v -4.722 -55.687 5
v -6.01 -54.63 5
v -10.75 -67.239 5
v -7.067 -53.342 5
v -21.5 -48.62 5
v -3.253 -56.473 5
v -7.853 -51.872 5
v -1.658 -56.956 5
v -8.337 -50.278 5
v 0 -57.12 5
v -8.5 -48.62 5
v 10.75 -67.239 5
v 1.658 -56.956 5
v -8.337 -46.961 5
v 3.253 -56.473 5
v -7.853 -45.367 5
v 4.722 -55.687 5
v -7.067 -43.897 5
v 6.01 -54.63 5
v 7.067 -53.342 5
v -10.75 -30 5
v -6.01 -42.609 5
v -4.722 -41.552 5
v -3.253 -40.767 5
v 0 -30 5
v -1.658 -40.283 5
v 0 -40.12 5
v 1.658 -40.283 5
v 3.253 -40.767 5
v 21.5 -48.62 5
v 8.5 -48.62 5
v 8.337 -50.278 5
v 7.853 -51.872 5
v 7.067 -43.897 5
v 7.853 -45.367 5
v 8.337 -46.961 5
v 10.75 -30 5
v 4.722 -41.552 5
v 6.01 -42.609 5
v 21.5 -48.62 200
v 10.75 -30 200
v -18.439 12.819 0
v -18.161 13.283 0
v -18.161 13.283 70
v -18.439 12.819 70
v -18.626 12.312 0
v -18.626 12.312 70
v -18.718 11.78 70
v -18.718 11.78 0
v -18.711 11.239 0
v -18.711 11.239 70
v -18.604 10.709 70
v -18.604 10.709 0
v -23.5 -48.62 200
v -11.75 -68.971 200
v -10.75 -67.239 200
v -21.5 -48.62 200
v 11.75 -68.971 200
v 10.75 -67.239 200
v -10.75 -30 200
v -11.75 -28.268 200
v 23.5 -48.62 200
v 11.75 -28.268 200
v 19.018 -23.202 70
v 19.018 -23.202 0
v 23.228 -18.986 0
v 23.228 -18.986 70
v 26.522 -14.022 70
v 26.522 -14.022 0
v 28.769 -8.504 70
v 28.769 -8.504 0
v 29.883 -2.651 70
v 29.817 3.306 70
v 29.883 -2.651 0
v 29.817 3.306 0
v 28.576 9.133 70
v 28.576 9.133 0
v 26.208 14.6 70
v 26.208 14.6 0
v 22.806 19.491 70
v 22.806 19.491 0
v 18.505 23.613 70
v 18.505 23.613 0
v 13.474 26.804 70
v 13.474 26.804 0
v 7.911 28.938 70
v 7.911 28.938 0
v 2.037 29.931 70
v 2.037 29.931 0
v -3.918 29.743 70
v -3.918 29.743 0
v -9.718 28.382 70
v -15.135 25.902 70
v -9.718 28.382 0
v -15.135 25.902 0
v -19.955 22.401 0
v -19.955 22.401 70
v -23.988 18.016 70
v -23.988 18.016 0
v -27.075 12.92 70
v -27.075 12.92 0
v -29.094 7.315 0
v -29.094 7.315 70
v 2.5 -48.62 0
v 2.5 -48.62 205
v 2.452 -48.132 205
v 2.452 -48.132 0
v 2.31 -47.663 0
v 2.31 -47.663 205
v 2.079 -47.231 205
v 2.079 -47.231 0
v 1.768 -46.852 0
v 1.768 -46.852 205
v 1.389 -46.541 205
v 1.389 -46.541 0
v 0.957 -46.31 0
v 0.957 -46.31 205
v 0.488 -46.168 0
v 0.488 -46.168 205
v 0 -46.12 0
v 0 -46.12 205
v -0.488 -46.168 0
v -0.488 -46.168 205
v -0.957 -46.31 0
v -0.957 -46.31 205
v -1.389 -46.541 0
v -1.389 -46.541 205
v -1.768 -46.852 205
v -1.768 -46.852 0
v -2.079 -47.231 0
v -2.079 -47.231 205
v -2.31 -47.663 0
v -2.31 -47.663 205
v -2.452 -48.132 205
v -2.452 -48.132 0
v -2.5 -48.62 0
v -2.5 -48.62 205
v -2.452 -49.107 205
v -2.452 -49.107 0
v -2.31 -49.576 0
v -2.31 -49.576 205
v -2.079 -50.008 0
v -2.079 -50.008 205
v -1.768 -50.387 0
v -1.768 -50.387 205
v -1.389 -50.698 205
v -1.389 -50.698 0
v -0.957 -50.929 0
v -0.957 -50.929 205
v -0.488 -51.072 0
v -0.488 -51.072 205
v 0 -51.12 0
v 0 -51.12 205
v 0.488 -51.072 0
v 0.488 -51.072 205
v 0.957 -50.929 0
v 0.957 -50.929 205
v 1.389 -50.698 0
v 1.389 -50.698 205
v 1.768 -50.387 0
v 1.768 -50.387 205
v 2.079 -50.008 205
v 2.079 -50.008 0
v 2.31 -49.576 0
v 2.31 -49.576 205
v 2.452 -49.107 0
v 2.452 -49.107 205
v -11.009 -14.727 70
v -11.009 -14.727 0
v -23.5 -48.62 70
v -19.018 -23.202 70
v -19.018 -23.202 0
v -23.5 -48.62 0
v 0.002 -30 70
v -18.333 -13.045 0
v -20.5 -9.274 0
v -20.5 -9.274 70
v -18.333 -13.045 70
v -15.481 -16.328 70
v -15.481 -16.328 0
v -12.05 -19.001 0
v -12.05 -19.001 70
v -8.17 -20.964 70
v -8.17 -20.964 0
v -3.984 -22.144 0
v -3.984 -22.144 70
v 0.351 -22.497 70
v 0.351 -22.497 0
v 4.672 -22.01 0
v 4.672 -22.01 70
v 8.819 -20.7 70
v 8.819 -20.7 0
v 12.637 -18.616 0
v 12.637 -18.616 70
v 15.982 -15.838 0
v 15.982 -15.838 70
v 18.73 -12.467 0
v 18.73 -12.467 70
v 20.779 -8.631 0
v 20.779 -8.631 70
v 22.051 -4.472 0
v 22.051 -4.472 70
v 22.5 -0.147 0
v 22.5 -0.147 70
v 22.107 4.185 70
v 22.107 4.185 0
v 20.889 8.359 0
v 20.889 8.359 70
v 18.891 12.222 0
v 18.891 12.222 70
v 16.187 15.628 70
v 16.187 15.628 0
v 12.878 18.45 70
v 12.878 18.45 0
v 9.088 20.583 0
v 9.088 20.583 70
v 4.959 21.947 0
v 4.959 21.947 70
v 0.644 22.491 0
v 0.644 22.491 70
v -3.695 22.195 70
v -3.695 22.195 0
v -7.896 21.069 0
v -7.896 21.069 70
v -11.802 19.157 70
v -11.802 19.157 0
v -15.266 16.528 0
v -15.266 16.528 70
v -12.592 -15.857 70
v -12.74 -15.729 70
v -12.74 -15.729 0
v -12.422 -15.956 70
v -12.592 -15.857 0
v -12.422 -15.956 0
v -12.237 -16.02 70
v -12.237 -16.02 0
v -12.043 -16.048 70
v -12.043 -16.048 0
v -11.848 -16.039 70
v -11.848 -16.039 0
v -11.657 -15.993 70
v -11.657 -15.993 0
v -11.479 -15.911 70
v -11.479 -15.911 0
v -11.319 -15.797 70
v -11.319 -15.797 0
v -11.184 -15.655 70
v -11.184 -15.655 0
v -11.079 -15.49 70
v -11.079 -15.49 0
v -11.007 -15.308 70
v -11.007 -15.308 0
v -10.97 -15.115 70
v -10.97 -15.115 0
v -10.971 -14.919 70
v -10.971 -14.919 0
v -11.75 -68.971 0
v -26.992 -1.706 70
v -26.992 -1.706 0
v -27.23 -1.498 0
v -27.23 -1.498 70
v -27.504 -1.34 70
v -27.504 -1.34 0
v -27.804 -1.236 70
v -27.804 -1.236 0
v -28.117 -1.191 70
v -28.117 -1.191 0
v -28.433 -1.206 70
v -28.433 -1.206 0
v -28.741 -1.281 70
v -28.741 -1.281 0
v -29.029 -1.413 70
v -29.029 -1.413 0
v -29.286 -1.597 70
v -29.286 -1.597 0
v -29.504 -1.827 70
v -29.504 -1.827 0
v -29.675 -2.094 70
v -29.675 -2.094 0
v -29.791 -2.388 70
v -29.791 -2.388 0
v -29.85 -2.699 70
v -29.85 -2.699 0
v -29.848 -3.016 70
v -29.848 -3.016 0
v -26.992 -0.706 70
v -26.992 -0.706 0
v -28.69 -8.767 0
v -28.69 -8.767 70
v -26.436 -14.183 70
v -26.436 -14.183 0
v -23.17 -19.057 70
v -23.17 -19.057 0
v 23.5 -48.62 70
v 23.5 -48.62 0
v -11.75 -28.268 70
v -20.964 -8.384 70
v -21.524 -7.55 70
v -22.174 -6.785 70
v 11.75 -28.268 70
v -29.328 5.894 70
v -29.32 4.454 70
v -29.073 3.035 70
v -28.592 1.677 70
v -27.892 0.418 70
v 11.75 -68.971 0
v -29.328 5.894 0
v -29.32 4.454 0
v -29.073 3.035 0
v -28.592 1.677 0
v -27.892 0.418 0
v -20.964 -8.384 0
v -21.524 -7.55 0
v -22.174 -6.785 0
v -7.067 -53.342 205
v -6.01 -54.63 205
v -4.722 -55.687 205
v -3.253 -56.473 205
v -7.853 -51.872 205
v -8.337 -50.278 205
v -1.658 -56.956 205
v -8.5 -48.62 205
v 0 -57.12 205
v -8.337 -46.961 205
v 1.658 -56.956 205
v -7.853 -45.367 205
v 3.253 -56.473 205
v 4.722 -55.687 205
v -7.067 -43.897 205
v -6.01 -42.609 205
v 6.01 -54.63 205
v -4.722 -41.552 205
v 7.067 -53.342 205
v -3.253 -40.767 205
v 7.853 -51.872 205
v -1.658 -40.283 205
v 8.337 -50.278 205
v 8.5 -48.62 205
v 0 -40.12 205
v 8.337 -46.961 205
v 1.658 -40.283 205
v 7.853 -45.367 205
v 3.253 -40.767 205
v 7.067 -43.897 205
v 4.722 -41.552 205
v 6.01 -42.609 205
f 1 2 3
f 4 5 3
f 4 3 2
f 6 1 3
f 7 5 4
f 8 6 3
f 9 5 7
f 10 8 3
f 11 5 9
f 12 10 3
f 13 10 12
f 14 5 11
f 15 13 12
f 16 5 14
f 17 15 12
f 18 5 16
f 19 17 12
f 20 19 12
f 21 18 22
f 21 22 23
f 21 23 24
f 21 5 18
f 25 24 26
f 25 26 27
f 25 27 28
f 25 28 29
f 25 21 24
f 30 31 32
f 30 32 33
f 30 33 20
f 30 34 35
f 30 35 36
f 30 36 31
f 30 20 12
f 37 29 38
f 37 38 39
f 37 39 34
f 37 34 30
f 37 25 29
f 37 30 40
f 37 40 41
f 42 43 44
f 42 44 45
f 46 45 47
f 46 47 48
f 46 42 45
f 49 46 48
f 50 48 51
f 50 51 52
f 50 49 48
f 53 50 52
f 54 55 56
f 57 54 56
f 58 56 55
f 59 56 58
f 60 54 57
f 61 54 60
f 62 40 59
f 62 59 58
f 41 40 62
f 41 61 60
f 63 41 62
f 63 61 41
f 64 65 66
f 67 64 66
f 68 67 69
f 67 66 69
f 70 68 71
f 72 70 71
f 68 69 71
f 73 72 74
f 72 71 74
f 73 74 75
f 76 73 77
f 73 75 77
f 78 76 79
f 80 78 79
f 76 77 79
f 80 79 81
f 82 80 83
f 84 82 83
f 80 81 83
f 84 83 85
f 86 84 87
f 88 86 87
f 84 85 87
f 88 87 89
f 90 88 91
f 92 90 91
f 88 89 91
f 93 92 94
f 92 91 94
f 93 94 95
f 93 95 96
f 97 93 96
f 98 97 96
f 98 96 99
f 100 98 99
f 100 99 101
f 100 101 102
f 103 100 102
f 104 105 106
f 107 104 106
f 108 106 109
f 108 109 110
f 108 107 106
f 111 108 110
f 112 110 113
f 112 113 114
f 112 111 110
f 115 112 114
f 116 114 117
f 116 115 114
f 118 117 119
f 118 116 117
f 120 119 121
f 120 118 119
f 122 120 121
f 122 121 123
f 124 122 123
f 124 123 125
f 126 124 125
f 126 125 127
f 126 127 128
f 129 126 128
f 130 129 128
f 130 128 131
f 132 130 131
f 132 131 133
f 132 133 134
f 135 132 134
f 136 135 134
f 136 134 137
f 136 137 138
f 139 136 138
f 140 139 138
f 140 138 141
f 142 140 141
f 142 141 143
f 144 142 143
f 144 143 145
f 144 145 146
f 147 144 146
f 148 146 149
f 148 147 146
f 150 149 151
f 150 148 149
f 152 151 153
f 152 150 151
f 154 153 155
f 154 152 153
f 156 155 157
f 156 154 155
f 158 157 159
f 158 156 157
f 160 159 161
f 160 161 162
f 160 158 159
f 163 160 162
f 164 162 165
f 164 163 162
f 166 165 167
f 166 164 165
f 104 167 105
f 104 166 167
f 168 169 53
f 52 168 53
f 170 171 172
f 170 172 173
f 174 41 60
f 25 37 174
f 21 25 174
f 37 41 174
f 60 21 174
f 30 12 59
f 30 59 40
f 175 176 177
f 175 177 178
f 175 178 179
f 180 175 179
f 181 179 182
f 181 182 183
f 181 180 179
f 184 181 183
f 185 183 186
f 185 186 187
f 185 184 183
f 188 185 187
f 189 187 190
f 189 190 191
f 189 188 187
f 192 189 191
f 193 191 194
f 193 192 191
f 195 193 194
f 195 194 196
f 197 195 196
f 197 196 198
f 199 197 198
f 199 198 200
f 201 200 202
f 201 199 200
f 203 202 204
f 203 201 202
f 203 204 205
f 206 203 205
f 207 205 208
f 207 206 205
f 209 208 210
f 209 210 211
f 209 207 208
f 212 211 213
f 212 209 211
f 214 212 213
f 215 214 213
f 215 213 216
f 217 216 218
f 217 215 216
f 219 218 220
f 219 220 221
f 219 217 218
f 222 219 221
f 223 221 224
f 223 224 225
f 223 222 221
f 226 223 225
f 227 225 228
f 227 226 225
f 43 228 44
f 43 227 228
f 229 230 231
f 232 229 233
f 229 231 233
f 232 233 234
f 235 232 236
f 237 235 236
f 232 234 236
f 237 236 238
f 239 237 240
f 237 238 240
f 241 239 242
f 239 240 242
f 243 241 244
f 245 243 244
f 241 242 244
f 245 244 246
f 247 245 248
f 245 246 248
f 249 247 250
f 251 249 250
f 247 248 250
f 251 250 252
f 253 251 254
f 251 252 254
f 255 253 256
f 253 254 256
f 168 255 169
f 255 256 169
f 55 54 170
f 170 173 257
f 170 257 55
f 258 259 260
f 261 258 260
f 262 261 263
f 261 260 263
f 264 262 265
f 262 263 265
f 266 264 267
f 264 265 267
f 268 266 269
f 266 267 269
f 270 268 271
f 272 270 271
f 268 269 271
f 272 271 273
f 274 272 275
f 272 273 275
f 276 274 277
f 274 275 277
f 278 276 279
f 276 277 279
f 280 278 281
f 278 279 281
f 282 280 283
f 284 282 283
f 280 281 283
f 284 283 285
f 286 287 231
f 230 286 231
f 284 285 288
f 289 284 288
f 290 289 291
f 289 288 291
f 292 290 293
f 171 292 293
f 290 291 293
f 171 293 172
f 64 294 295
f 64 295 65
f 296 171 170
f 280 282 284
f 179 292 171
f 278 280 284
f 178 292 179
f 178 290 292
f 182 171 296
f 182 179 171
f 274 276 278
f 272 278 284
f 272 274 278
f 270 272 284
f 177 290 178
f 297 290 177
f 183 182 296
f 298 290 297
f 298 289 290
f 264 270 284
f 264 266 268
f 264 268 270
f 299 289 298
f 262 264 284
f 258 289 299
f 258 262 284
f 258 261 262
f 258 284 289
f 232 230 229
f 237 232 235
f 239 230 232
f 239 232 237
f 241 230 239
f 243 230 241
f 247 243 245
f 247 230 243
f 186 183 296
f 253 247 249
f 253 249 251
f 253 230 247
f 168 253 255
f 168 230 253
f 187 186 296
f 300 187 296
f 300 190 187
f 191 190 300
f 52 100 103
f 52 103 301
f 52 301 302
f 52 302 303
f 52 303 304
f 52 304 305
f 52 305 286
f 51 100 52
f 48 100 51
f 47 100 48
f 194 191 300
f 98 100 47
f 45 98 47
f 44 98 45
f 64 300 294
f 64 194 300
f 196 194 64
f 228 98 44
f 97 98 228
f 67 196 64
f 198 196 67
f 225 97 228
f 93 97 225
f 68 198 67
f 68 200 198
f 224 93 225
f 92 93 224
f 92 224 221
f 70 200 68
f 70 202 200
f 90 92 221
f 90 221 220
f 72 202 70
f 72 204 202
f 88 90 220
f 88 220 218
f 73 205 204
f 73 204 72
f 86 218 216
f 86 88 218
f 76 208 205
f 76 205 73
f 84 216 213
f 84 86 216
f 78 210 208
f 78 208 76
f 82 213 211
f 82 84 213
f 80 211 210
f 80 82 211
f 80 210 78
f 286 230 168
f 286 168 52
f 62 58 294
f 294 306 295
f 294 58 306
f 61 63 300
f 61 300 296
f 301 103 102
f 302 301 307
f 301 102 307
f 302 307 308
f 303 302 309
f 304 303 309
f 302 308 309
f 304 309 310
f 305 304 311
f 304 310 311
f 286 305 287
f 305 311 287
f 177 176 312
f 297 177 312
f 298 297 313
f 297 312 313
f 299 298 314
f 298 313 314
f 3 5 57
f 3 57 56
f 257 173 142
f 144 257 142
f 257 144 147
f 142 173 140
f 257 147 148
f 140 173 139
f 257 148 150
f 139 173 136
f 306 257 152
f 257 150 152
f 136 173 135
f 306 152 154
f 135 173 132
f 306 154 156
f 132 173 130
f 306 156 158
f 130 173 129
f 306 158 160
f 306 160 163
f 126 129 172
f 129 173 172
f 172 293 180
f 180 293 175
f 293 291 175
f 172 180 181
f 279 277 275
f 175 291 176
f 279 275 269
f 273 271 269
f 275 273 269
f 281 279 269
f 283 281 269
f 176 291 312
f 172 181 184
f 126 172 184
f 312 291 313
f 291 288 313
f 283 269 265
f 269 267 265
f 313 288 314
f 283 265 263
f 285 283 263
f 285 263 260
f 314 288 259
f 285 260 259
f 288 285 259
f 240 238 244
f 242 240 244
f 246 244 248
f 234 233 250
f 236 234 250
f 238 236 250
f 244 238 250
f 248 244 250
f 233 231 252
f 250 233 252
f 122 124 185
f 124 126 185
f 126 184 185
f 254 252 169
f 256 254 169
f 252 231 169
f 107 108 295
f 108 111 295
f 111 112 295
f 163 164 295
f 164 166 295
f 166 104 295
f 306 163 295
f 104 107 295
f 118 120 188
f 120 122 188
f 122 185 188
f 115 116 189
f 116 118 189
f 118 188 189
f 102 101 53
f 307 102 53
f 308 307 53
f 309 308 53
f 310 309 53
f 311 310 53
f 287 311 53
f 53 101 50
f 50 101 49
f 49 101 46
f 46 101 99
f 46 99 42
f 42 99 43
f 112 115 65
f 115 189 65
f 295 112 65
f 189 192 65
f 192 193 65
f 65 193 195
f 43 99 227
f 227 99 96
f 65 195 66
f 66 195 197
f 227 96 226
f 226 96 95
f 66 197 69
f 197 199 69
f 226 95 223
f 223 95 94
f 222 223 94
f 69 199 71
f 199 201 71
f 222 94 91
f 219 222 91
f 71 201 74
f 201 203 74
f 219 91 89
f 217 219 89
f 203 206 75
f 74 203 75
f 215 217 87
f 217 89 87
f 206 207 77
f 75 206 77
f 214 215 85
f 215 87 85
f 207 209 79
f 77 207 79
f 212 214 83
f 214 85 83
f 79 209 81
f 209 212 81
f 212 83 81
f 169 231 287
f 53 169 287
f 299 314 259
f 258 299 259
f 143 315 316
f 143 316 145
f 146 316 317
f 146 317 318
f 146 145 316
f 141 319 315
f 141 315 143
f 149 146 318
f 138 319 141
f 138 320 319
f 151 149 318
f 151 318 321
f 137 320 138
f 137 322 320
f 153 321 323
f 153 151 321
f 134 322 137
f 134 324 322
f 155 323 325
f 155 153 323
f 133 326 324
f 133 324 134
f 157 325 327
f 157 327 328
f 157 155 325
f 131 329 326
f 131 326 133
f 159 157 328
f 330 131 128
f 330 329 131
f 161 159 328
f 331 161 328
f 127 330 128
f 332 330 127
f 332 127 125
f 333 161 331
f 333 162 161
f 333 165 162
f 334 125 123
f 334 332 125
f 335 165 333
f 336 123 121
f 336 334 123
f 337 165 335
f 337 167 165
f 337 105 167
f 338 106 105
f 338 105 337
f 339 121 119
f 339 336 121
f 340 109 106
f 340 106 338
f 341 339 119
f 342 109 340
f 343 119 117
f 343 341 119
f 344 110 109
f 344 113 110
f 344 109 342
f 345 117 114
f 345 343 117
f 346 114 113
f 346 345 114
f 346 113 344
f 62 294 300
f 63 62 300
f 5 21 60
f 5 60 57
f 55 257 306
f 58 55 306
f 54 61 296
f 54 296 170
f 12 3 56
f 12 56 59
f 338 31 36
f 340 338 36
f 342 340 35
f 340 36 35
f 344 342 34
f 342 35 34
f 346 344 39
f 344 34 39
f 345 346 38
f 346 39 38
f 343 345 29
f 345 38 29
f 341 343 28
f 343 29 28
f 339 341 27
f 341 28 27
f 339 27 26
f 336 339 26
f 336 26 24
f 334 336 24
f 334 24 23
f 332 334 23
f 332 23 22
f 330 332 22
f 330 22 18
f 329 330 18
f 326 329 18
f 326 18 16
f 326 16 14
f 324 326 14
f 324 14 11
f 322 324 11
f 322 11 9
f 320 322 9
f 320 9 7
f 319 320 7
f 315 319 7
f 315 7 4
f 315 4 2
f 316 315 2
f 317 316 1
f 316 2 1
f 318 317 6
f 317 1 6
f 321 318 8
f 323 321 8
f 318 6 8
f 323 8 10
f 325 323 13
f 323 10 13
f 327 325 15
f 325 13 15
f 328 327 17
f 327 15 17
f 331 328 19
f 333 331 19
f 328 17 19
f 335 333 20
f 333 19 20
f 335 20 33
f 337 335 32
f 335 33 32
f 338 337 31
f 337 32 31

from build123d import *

# Parameters (mm, degrees)
PAD_DEPTH     = 70
PAD001_DEPTH  = 200
PAD002_DEPTH  = 70
SKETCH003_R   = 2.5
PAD003_DEPTH  = 5
SKETCH004_R   = 8.5
SKETCH004_R_2 = 2.5
PAD004_DEPTH  = 205


with BuildPart() as part:
    # Sketch → Pad (new body)
    with BuildSketch(Plane.XY):
        with BuildLine():
            ThreePointArc((-29.848016, -3.015947), (29.920505, -2.182515), (-29.094406, 7.315431))
            ThreePointArc((-29.094406, 7.315431), (-29.072912, 3.034578), (-26.991574, -0.706304))
            Line((-26.991574, -0.706304), (-12.739759, -15.728805))
            ThreePointArc((-12.739759, -15.728805), (-11.4789, -15.911046), (-11.008743, -14.727014))
            Line((-11.008743, -14.727014), (-18.604437, 10.709188))
            ThreePointArc((-18.160969, 13.282665), (-18.684551, 12.047942), (-18.604437, 10.709188))
            ThreePointArc((-20.499669, -9.27435), (22.380035, -2.320351), (-18.160969, 13.282665))
            ThreePointArc((-20.499669, -9.27435), (-21.232479, -7.959372), (-22.173804, -6.784601))
            Line((-22.173804, -6.784601), (-26.991574, -1.706304))
            ThreePointArc((-26.991574, -1.706304), (-28.888073, -1.339771), (-29.848016, -3.015947))
        make_face()
    extrude(amount=PAD_DEPTH)

    # Sketch001 → Pad001 (join)
    with BuildSketch(Plane.XY):
        Polygon((23.5, -48.619546), (11.75, -28.267949), (-11.75, -28.267949), (-23.5, -48.619546), (-11.75, -68.971143), (11.75, -68.971143), align=None)
        Polygon((21.5, -48.619546), (10.75, -30), (-10.75, -30), (-21.5, -48.619546), (-10.75, -67.239092), (10.75, -67.239092), align=None, mode=Mode.SUBTRACT)
    extrude(amount=PAD001_DEPTH)

    # Sketch002 → Pad002 (join)
    with BuildSketch(Plane.XY):
        Polygon((-18.915001, -22.616726), (-23.5, -48.619546), (-11.75, -28.267949), (-6.937376, -28.267949), align=None)
        Polygon((23.5, -48.619546), (19.018119, -23.201534), (10.046046, -28.267949), (11.75, -28.267949), align=None)
    extrude(amount=PAD002_DEPTH)

    # Sketch003 → Pad003 (join)
    with BuildSketch(Plane.XY):
        Polygon((21.5, -48.619546), (10.75, -30), (-10.75, -30), (-21.5, -48.619546), (-10.75, -67.239092), (10.75, -67.239092), align=None)
        with Locations((0, -48.619546)):
            Circle(SKETCH003_R, mode=Mode.SUBTRACT)
    extrude(amount=PAD003_DEPTH)

    # Sketch004 → Pad004 (join)
    with BuildSketch(Plane.XY):
        with Locations((0, -48.619546)):
            Circle(SKETCH004_R)
        with Locations((0, -48.619546)):
            Circle(SKETCH004_R_2, mode=Mode.SUBTRACT)
    extrude(amount=PAD004_DEPTH)


solid = part.part
